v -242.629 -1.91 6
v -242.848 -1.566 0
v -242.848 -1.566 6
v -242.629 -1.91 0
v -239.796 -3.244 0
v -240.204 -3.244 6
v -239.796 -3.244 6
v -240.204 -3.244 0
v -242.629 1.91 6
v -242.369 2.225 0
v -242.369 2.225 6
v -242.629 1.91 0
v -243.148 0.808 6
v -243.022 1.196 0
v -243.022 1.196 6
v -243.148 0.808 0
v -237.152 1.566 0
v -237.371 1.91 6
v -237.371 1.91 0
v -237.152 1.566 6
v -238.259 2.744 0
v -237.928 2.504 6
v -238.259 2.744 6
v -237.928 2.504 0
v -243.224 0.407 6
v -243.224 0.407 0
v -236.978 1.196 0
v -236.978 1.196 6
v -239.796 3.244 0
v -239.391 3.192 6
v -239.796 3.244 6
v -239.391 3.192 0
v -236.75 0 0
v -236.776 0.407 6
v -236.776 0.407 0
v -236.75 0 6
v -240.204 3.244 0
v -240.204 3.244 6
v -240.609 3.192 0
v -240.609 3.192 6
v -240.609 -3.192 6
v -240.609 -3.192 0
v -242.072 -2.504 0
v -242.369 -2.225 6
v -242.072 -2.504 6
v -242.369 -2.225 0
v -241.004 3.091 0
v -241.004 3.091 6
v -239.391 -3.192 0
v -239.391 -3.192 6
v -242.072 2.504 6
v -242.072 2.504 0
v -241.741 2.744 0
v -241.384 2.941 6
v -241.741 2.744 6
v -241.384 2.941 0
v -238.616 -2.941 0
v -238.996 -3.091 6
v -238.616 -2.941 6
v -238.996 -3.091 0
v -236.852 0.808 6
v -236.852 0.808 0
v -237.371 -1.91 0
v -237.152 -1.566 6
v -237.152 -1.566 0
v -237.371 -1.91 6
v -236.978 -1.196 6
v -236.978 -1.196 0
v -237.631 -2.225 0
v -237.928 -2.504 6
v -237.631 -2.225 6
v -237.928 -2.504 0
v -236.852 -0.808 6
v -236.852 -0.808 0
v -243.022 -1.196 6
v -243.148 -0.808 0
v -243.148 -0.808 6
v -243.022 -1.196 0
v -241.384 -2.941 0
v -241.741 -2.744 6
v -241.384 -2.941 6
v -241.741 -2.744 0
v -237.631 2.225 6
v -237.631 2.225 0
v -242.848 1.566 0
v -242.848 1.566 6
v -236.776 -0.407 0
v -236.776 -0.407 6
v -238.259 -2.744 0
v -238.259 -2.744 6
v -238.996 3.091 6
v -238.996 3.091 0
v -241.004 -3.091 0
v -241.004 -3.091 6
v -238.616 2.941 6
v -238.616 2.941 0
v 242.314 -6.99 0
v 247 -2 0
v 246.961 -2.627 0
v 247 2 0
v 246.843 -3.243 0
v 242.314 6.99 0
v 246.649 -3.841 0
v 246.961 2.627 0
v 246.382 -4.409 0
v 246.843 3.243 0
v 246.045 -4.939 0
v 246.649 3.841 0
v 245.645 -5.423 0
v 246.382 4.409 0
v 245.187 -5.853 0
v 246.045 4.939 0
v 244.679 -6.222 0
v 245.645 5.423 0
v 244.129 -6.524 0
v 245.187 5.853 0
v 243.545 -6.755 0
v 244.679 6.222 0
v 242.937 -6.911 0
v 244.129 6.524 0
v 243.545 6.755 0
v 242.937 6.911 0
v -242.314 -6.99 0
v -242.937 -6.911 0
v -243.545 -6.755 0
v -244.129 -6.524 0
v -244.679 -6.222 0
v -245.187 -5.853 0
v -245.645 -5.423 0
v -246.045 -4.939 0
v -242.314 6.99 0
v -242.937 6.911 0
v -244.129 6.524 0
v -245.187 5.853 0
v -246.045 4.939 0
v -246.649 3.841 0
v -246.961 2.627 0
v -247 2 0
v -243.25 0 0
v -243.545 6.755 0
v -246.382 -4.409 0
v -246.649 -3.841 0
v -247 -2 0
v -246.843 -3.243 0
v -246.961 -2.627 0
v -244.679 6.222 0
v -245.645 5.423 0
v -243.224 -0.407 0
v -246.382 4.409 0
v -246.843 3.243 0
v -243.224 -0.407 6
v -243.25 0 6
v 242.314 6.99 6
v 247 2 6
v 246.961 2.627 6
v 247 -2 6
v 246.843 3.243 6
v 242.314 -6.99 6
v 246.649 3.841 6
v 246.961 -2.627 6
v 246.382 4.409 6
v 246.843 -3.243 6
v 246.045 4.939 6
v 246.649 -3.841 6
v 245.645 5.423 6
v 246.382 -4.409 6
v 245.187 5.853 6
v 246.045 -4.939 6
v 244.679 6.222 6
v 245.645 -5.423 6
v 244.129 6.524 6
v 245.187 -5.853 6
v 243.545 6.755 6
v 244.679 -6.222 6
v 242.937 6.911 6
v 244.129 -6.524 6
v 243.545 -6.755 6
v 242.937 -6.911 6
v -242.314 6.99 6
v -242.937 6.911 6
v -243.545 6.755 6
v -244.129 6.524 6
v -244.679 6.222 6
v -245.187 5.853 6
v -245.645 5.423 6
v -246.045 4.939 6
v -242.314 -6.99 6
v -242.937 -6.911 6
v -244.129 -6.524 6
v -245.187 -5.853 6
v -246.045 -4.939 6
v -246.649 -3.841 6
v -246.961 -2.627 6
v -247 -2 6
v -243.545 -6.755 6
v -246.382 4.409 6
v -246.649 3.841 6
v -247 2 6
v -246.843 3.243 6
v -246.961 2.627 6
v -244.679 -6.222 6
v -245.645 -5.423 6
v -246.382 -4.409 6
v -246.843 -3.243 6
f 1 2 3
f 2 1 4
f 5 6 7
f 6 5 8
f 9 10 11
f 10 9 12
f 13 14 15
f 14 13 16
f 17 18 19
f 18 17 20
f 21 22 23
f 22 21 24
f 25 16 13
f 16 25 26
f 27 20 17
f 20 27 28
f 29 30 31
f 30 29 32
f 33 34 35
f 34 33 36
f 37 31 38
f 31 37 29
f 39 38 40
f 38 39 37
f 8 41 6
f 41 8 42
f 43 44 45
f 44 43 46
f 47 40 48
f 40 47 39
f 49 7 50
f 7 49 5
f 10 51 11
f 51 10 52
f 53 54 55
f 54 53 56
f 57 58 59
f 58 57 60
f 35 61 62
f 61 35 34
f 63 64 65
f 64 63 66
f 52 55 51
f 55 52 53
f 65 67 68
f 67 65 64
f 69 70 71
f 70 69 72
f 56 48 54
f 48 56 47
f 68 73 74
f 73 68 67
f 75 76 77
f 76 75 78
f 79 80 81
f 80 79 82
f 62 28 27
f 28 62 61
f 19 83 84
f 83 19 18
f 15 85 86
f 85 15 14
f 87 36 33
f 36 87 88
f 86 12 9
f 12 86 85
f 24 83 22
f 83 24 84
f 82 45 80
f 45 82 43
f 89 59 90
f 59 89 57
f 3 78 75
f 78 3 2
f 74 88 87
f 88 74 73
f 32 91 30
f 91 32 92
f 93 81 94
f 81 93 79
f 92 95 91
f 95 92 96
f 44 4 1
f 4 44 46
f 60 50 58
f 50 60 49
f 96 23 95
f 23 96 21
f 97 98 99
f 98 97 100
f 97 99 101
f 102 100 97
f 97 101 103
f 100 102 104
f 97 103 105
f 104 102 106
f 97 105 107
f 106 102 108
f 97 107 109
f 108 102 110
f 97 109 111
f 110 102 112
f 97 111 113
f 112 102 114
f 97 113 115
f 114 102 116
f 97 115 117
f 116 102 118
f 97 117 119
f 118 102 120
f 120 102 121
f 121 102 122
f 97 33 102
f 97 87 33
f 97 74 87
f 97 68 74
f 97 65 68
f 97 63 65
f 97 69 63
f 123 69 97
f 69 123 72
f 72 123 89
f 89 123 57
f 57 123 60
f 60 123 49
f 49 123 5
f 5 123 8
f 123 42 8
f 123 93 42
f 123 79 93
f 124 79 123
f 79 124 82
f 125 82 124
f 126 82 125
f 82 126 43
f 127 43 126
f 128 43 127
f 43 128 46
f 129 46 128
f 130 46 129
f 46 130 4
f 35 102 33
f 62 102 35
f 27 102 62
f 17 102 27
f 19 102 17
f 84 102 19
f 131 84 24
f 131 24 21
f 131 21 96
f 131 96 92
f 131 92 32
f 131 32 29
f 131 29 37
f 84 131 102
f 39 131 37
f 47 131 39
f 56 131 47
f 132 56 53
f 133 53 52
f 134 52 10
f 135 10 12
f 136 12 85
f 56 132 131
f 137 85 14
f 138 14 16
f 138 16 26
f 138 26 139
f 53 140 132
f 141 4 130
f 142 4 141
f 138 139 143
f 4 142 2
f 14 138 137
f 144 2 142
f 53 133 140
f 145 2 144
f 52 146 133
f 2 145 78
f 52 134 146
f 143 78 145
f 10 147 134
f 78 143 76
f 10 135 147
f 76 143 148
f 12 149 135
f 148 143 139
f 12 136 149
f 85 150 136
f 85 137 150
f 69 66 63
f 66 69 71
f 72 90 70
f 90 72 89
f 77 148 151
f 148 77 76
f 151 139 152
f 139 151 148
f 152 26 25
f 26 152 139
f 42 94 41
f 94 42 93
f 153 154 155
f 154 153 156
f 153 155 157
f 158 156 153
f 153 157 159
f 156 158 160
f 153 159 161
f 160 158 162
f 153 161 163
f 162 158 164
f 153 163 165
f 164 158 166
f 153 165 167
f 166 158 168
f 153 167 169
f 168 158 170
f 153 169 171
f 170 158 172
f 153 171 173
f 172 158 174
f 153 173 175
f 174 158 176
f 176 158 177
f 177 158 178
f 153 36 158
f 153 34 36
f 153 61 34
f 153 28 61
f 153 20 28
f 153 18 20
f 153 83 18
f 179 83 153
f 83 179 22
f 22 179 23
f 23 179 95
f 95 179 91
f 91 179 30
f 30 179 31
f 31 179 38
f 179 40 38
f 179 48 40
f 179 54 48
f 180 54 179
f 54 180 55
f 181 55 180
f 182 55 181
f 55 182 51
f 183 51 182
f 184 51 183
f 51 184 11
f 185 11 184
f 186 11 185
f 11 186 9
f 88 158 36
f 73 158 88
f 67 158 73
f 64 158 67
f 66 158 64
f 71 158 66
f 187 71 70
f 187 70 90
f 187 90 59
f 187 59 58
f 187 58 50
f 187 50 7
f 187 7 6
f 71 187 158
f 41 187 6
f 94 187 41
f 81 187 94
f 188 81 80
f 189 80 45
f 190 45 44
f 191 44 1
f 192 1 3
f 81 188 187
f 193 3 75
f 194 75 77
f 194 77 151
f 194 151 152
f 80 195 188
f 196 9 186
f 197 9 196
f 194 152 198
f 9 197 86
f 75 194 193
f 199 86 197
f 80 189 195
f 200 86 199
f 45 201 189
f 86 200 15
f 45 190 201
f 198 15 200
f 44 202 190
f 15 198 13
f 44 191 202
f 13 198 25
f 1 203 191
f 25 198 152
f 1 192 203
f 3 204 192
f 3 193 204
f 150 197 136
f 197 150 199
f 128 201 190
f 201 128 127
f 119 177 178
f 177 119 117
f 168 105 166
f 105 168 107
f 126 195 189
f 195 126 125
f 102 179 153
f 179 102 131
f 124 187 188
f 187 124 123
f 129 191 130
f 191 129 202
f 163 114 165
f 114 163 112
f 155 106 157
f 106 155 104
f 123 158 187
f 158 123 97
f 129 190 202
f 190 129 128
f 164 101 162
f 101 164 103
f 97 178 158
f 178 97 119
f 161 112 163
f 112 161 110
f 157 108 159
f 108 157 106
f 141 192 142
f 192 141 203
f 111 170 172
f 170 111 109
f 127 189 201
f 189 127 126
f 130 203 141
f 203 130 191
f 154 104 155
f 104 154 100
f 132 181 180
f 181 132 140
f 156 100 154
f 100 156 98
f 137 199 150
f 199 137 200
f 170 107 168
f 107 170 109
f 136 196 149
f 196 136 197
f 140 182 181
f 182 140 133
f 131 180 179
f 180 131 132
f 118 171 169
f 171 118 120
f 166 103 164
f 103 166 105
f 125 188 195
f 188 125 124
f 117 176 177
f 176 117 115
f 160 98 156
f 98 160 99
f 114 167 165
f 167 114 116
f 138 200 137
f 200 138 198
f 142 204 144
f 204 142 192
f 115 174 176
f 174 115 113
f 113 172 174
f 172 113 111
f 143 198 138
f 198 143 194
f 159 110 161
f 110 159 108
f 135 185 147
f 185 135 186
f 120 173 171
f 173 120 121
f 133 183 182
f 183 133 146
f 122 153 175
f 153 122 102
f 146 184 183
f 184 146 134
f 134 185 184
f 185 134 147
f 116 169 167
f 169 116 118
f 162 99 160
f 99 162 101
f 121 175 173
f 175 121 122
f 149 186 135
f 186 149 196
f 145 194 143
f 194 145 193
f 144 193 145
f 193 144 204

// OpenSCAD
$fn = 50;


difference() {
	union() {
		hull() {
			translate(v = [-242.0000000000, 2.0000000000, 0]) {
				cylinder(h = 6, r = 5);
			}
			translate(v = [242.0000000000, 2.0000000000, 0]) {
				cylinder(h = 6, r = 5);
			}
			translate(v = [-242.0000000000, -2.0000000000, 0]) {
				cylinder(h = 6, r = 5);
			}
			translate(v = [242.0000000000, -2.0000000000, 0]) {
				cylinder(h = 6, r = 5);
			}
		}
	}
	union() {
		translate(v = [-240.0000000000, 0.0000000000, 0]) {
			cylinder(h = 6, r = 3.2500000000);
		}
		translate(v = [-240.0000000000, 0.0000000000, 0]) {
			cylinder(h = 6, r = 1.8000000000);
		}
		translate(v = [-240.0000000000, 0.0000000000, 0]) {
			cylinder(h = 6, r = 1.8000000000);
		}
		translate(v = [-240.0000000000, 0.0000000000, 0]) {
			cylinder(h = 6, r = 1.8000000000);
		}
	}
}
